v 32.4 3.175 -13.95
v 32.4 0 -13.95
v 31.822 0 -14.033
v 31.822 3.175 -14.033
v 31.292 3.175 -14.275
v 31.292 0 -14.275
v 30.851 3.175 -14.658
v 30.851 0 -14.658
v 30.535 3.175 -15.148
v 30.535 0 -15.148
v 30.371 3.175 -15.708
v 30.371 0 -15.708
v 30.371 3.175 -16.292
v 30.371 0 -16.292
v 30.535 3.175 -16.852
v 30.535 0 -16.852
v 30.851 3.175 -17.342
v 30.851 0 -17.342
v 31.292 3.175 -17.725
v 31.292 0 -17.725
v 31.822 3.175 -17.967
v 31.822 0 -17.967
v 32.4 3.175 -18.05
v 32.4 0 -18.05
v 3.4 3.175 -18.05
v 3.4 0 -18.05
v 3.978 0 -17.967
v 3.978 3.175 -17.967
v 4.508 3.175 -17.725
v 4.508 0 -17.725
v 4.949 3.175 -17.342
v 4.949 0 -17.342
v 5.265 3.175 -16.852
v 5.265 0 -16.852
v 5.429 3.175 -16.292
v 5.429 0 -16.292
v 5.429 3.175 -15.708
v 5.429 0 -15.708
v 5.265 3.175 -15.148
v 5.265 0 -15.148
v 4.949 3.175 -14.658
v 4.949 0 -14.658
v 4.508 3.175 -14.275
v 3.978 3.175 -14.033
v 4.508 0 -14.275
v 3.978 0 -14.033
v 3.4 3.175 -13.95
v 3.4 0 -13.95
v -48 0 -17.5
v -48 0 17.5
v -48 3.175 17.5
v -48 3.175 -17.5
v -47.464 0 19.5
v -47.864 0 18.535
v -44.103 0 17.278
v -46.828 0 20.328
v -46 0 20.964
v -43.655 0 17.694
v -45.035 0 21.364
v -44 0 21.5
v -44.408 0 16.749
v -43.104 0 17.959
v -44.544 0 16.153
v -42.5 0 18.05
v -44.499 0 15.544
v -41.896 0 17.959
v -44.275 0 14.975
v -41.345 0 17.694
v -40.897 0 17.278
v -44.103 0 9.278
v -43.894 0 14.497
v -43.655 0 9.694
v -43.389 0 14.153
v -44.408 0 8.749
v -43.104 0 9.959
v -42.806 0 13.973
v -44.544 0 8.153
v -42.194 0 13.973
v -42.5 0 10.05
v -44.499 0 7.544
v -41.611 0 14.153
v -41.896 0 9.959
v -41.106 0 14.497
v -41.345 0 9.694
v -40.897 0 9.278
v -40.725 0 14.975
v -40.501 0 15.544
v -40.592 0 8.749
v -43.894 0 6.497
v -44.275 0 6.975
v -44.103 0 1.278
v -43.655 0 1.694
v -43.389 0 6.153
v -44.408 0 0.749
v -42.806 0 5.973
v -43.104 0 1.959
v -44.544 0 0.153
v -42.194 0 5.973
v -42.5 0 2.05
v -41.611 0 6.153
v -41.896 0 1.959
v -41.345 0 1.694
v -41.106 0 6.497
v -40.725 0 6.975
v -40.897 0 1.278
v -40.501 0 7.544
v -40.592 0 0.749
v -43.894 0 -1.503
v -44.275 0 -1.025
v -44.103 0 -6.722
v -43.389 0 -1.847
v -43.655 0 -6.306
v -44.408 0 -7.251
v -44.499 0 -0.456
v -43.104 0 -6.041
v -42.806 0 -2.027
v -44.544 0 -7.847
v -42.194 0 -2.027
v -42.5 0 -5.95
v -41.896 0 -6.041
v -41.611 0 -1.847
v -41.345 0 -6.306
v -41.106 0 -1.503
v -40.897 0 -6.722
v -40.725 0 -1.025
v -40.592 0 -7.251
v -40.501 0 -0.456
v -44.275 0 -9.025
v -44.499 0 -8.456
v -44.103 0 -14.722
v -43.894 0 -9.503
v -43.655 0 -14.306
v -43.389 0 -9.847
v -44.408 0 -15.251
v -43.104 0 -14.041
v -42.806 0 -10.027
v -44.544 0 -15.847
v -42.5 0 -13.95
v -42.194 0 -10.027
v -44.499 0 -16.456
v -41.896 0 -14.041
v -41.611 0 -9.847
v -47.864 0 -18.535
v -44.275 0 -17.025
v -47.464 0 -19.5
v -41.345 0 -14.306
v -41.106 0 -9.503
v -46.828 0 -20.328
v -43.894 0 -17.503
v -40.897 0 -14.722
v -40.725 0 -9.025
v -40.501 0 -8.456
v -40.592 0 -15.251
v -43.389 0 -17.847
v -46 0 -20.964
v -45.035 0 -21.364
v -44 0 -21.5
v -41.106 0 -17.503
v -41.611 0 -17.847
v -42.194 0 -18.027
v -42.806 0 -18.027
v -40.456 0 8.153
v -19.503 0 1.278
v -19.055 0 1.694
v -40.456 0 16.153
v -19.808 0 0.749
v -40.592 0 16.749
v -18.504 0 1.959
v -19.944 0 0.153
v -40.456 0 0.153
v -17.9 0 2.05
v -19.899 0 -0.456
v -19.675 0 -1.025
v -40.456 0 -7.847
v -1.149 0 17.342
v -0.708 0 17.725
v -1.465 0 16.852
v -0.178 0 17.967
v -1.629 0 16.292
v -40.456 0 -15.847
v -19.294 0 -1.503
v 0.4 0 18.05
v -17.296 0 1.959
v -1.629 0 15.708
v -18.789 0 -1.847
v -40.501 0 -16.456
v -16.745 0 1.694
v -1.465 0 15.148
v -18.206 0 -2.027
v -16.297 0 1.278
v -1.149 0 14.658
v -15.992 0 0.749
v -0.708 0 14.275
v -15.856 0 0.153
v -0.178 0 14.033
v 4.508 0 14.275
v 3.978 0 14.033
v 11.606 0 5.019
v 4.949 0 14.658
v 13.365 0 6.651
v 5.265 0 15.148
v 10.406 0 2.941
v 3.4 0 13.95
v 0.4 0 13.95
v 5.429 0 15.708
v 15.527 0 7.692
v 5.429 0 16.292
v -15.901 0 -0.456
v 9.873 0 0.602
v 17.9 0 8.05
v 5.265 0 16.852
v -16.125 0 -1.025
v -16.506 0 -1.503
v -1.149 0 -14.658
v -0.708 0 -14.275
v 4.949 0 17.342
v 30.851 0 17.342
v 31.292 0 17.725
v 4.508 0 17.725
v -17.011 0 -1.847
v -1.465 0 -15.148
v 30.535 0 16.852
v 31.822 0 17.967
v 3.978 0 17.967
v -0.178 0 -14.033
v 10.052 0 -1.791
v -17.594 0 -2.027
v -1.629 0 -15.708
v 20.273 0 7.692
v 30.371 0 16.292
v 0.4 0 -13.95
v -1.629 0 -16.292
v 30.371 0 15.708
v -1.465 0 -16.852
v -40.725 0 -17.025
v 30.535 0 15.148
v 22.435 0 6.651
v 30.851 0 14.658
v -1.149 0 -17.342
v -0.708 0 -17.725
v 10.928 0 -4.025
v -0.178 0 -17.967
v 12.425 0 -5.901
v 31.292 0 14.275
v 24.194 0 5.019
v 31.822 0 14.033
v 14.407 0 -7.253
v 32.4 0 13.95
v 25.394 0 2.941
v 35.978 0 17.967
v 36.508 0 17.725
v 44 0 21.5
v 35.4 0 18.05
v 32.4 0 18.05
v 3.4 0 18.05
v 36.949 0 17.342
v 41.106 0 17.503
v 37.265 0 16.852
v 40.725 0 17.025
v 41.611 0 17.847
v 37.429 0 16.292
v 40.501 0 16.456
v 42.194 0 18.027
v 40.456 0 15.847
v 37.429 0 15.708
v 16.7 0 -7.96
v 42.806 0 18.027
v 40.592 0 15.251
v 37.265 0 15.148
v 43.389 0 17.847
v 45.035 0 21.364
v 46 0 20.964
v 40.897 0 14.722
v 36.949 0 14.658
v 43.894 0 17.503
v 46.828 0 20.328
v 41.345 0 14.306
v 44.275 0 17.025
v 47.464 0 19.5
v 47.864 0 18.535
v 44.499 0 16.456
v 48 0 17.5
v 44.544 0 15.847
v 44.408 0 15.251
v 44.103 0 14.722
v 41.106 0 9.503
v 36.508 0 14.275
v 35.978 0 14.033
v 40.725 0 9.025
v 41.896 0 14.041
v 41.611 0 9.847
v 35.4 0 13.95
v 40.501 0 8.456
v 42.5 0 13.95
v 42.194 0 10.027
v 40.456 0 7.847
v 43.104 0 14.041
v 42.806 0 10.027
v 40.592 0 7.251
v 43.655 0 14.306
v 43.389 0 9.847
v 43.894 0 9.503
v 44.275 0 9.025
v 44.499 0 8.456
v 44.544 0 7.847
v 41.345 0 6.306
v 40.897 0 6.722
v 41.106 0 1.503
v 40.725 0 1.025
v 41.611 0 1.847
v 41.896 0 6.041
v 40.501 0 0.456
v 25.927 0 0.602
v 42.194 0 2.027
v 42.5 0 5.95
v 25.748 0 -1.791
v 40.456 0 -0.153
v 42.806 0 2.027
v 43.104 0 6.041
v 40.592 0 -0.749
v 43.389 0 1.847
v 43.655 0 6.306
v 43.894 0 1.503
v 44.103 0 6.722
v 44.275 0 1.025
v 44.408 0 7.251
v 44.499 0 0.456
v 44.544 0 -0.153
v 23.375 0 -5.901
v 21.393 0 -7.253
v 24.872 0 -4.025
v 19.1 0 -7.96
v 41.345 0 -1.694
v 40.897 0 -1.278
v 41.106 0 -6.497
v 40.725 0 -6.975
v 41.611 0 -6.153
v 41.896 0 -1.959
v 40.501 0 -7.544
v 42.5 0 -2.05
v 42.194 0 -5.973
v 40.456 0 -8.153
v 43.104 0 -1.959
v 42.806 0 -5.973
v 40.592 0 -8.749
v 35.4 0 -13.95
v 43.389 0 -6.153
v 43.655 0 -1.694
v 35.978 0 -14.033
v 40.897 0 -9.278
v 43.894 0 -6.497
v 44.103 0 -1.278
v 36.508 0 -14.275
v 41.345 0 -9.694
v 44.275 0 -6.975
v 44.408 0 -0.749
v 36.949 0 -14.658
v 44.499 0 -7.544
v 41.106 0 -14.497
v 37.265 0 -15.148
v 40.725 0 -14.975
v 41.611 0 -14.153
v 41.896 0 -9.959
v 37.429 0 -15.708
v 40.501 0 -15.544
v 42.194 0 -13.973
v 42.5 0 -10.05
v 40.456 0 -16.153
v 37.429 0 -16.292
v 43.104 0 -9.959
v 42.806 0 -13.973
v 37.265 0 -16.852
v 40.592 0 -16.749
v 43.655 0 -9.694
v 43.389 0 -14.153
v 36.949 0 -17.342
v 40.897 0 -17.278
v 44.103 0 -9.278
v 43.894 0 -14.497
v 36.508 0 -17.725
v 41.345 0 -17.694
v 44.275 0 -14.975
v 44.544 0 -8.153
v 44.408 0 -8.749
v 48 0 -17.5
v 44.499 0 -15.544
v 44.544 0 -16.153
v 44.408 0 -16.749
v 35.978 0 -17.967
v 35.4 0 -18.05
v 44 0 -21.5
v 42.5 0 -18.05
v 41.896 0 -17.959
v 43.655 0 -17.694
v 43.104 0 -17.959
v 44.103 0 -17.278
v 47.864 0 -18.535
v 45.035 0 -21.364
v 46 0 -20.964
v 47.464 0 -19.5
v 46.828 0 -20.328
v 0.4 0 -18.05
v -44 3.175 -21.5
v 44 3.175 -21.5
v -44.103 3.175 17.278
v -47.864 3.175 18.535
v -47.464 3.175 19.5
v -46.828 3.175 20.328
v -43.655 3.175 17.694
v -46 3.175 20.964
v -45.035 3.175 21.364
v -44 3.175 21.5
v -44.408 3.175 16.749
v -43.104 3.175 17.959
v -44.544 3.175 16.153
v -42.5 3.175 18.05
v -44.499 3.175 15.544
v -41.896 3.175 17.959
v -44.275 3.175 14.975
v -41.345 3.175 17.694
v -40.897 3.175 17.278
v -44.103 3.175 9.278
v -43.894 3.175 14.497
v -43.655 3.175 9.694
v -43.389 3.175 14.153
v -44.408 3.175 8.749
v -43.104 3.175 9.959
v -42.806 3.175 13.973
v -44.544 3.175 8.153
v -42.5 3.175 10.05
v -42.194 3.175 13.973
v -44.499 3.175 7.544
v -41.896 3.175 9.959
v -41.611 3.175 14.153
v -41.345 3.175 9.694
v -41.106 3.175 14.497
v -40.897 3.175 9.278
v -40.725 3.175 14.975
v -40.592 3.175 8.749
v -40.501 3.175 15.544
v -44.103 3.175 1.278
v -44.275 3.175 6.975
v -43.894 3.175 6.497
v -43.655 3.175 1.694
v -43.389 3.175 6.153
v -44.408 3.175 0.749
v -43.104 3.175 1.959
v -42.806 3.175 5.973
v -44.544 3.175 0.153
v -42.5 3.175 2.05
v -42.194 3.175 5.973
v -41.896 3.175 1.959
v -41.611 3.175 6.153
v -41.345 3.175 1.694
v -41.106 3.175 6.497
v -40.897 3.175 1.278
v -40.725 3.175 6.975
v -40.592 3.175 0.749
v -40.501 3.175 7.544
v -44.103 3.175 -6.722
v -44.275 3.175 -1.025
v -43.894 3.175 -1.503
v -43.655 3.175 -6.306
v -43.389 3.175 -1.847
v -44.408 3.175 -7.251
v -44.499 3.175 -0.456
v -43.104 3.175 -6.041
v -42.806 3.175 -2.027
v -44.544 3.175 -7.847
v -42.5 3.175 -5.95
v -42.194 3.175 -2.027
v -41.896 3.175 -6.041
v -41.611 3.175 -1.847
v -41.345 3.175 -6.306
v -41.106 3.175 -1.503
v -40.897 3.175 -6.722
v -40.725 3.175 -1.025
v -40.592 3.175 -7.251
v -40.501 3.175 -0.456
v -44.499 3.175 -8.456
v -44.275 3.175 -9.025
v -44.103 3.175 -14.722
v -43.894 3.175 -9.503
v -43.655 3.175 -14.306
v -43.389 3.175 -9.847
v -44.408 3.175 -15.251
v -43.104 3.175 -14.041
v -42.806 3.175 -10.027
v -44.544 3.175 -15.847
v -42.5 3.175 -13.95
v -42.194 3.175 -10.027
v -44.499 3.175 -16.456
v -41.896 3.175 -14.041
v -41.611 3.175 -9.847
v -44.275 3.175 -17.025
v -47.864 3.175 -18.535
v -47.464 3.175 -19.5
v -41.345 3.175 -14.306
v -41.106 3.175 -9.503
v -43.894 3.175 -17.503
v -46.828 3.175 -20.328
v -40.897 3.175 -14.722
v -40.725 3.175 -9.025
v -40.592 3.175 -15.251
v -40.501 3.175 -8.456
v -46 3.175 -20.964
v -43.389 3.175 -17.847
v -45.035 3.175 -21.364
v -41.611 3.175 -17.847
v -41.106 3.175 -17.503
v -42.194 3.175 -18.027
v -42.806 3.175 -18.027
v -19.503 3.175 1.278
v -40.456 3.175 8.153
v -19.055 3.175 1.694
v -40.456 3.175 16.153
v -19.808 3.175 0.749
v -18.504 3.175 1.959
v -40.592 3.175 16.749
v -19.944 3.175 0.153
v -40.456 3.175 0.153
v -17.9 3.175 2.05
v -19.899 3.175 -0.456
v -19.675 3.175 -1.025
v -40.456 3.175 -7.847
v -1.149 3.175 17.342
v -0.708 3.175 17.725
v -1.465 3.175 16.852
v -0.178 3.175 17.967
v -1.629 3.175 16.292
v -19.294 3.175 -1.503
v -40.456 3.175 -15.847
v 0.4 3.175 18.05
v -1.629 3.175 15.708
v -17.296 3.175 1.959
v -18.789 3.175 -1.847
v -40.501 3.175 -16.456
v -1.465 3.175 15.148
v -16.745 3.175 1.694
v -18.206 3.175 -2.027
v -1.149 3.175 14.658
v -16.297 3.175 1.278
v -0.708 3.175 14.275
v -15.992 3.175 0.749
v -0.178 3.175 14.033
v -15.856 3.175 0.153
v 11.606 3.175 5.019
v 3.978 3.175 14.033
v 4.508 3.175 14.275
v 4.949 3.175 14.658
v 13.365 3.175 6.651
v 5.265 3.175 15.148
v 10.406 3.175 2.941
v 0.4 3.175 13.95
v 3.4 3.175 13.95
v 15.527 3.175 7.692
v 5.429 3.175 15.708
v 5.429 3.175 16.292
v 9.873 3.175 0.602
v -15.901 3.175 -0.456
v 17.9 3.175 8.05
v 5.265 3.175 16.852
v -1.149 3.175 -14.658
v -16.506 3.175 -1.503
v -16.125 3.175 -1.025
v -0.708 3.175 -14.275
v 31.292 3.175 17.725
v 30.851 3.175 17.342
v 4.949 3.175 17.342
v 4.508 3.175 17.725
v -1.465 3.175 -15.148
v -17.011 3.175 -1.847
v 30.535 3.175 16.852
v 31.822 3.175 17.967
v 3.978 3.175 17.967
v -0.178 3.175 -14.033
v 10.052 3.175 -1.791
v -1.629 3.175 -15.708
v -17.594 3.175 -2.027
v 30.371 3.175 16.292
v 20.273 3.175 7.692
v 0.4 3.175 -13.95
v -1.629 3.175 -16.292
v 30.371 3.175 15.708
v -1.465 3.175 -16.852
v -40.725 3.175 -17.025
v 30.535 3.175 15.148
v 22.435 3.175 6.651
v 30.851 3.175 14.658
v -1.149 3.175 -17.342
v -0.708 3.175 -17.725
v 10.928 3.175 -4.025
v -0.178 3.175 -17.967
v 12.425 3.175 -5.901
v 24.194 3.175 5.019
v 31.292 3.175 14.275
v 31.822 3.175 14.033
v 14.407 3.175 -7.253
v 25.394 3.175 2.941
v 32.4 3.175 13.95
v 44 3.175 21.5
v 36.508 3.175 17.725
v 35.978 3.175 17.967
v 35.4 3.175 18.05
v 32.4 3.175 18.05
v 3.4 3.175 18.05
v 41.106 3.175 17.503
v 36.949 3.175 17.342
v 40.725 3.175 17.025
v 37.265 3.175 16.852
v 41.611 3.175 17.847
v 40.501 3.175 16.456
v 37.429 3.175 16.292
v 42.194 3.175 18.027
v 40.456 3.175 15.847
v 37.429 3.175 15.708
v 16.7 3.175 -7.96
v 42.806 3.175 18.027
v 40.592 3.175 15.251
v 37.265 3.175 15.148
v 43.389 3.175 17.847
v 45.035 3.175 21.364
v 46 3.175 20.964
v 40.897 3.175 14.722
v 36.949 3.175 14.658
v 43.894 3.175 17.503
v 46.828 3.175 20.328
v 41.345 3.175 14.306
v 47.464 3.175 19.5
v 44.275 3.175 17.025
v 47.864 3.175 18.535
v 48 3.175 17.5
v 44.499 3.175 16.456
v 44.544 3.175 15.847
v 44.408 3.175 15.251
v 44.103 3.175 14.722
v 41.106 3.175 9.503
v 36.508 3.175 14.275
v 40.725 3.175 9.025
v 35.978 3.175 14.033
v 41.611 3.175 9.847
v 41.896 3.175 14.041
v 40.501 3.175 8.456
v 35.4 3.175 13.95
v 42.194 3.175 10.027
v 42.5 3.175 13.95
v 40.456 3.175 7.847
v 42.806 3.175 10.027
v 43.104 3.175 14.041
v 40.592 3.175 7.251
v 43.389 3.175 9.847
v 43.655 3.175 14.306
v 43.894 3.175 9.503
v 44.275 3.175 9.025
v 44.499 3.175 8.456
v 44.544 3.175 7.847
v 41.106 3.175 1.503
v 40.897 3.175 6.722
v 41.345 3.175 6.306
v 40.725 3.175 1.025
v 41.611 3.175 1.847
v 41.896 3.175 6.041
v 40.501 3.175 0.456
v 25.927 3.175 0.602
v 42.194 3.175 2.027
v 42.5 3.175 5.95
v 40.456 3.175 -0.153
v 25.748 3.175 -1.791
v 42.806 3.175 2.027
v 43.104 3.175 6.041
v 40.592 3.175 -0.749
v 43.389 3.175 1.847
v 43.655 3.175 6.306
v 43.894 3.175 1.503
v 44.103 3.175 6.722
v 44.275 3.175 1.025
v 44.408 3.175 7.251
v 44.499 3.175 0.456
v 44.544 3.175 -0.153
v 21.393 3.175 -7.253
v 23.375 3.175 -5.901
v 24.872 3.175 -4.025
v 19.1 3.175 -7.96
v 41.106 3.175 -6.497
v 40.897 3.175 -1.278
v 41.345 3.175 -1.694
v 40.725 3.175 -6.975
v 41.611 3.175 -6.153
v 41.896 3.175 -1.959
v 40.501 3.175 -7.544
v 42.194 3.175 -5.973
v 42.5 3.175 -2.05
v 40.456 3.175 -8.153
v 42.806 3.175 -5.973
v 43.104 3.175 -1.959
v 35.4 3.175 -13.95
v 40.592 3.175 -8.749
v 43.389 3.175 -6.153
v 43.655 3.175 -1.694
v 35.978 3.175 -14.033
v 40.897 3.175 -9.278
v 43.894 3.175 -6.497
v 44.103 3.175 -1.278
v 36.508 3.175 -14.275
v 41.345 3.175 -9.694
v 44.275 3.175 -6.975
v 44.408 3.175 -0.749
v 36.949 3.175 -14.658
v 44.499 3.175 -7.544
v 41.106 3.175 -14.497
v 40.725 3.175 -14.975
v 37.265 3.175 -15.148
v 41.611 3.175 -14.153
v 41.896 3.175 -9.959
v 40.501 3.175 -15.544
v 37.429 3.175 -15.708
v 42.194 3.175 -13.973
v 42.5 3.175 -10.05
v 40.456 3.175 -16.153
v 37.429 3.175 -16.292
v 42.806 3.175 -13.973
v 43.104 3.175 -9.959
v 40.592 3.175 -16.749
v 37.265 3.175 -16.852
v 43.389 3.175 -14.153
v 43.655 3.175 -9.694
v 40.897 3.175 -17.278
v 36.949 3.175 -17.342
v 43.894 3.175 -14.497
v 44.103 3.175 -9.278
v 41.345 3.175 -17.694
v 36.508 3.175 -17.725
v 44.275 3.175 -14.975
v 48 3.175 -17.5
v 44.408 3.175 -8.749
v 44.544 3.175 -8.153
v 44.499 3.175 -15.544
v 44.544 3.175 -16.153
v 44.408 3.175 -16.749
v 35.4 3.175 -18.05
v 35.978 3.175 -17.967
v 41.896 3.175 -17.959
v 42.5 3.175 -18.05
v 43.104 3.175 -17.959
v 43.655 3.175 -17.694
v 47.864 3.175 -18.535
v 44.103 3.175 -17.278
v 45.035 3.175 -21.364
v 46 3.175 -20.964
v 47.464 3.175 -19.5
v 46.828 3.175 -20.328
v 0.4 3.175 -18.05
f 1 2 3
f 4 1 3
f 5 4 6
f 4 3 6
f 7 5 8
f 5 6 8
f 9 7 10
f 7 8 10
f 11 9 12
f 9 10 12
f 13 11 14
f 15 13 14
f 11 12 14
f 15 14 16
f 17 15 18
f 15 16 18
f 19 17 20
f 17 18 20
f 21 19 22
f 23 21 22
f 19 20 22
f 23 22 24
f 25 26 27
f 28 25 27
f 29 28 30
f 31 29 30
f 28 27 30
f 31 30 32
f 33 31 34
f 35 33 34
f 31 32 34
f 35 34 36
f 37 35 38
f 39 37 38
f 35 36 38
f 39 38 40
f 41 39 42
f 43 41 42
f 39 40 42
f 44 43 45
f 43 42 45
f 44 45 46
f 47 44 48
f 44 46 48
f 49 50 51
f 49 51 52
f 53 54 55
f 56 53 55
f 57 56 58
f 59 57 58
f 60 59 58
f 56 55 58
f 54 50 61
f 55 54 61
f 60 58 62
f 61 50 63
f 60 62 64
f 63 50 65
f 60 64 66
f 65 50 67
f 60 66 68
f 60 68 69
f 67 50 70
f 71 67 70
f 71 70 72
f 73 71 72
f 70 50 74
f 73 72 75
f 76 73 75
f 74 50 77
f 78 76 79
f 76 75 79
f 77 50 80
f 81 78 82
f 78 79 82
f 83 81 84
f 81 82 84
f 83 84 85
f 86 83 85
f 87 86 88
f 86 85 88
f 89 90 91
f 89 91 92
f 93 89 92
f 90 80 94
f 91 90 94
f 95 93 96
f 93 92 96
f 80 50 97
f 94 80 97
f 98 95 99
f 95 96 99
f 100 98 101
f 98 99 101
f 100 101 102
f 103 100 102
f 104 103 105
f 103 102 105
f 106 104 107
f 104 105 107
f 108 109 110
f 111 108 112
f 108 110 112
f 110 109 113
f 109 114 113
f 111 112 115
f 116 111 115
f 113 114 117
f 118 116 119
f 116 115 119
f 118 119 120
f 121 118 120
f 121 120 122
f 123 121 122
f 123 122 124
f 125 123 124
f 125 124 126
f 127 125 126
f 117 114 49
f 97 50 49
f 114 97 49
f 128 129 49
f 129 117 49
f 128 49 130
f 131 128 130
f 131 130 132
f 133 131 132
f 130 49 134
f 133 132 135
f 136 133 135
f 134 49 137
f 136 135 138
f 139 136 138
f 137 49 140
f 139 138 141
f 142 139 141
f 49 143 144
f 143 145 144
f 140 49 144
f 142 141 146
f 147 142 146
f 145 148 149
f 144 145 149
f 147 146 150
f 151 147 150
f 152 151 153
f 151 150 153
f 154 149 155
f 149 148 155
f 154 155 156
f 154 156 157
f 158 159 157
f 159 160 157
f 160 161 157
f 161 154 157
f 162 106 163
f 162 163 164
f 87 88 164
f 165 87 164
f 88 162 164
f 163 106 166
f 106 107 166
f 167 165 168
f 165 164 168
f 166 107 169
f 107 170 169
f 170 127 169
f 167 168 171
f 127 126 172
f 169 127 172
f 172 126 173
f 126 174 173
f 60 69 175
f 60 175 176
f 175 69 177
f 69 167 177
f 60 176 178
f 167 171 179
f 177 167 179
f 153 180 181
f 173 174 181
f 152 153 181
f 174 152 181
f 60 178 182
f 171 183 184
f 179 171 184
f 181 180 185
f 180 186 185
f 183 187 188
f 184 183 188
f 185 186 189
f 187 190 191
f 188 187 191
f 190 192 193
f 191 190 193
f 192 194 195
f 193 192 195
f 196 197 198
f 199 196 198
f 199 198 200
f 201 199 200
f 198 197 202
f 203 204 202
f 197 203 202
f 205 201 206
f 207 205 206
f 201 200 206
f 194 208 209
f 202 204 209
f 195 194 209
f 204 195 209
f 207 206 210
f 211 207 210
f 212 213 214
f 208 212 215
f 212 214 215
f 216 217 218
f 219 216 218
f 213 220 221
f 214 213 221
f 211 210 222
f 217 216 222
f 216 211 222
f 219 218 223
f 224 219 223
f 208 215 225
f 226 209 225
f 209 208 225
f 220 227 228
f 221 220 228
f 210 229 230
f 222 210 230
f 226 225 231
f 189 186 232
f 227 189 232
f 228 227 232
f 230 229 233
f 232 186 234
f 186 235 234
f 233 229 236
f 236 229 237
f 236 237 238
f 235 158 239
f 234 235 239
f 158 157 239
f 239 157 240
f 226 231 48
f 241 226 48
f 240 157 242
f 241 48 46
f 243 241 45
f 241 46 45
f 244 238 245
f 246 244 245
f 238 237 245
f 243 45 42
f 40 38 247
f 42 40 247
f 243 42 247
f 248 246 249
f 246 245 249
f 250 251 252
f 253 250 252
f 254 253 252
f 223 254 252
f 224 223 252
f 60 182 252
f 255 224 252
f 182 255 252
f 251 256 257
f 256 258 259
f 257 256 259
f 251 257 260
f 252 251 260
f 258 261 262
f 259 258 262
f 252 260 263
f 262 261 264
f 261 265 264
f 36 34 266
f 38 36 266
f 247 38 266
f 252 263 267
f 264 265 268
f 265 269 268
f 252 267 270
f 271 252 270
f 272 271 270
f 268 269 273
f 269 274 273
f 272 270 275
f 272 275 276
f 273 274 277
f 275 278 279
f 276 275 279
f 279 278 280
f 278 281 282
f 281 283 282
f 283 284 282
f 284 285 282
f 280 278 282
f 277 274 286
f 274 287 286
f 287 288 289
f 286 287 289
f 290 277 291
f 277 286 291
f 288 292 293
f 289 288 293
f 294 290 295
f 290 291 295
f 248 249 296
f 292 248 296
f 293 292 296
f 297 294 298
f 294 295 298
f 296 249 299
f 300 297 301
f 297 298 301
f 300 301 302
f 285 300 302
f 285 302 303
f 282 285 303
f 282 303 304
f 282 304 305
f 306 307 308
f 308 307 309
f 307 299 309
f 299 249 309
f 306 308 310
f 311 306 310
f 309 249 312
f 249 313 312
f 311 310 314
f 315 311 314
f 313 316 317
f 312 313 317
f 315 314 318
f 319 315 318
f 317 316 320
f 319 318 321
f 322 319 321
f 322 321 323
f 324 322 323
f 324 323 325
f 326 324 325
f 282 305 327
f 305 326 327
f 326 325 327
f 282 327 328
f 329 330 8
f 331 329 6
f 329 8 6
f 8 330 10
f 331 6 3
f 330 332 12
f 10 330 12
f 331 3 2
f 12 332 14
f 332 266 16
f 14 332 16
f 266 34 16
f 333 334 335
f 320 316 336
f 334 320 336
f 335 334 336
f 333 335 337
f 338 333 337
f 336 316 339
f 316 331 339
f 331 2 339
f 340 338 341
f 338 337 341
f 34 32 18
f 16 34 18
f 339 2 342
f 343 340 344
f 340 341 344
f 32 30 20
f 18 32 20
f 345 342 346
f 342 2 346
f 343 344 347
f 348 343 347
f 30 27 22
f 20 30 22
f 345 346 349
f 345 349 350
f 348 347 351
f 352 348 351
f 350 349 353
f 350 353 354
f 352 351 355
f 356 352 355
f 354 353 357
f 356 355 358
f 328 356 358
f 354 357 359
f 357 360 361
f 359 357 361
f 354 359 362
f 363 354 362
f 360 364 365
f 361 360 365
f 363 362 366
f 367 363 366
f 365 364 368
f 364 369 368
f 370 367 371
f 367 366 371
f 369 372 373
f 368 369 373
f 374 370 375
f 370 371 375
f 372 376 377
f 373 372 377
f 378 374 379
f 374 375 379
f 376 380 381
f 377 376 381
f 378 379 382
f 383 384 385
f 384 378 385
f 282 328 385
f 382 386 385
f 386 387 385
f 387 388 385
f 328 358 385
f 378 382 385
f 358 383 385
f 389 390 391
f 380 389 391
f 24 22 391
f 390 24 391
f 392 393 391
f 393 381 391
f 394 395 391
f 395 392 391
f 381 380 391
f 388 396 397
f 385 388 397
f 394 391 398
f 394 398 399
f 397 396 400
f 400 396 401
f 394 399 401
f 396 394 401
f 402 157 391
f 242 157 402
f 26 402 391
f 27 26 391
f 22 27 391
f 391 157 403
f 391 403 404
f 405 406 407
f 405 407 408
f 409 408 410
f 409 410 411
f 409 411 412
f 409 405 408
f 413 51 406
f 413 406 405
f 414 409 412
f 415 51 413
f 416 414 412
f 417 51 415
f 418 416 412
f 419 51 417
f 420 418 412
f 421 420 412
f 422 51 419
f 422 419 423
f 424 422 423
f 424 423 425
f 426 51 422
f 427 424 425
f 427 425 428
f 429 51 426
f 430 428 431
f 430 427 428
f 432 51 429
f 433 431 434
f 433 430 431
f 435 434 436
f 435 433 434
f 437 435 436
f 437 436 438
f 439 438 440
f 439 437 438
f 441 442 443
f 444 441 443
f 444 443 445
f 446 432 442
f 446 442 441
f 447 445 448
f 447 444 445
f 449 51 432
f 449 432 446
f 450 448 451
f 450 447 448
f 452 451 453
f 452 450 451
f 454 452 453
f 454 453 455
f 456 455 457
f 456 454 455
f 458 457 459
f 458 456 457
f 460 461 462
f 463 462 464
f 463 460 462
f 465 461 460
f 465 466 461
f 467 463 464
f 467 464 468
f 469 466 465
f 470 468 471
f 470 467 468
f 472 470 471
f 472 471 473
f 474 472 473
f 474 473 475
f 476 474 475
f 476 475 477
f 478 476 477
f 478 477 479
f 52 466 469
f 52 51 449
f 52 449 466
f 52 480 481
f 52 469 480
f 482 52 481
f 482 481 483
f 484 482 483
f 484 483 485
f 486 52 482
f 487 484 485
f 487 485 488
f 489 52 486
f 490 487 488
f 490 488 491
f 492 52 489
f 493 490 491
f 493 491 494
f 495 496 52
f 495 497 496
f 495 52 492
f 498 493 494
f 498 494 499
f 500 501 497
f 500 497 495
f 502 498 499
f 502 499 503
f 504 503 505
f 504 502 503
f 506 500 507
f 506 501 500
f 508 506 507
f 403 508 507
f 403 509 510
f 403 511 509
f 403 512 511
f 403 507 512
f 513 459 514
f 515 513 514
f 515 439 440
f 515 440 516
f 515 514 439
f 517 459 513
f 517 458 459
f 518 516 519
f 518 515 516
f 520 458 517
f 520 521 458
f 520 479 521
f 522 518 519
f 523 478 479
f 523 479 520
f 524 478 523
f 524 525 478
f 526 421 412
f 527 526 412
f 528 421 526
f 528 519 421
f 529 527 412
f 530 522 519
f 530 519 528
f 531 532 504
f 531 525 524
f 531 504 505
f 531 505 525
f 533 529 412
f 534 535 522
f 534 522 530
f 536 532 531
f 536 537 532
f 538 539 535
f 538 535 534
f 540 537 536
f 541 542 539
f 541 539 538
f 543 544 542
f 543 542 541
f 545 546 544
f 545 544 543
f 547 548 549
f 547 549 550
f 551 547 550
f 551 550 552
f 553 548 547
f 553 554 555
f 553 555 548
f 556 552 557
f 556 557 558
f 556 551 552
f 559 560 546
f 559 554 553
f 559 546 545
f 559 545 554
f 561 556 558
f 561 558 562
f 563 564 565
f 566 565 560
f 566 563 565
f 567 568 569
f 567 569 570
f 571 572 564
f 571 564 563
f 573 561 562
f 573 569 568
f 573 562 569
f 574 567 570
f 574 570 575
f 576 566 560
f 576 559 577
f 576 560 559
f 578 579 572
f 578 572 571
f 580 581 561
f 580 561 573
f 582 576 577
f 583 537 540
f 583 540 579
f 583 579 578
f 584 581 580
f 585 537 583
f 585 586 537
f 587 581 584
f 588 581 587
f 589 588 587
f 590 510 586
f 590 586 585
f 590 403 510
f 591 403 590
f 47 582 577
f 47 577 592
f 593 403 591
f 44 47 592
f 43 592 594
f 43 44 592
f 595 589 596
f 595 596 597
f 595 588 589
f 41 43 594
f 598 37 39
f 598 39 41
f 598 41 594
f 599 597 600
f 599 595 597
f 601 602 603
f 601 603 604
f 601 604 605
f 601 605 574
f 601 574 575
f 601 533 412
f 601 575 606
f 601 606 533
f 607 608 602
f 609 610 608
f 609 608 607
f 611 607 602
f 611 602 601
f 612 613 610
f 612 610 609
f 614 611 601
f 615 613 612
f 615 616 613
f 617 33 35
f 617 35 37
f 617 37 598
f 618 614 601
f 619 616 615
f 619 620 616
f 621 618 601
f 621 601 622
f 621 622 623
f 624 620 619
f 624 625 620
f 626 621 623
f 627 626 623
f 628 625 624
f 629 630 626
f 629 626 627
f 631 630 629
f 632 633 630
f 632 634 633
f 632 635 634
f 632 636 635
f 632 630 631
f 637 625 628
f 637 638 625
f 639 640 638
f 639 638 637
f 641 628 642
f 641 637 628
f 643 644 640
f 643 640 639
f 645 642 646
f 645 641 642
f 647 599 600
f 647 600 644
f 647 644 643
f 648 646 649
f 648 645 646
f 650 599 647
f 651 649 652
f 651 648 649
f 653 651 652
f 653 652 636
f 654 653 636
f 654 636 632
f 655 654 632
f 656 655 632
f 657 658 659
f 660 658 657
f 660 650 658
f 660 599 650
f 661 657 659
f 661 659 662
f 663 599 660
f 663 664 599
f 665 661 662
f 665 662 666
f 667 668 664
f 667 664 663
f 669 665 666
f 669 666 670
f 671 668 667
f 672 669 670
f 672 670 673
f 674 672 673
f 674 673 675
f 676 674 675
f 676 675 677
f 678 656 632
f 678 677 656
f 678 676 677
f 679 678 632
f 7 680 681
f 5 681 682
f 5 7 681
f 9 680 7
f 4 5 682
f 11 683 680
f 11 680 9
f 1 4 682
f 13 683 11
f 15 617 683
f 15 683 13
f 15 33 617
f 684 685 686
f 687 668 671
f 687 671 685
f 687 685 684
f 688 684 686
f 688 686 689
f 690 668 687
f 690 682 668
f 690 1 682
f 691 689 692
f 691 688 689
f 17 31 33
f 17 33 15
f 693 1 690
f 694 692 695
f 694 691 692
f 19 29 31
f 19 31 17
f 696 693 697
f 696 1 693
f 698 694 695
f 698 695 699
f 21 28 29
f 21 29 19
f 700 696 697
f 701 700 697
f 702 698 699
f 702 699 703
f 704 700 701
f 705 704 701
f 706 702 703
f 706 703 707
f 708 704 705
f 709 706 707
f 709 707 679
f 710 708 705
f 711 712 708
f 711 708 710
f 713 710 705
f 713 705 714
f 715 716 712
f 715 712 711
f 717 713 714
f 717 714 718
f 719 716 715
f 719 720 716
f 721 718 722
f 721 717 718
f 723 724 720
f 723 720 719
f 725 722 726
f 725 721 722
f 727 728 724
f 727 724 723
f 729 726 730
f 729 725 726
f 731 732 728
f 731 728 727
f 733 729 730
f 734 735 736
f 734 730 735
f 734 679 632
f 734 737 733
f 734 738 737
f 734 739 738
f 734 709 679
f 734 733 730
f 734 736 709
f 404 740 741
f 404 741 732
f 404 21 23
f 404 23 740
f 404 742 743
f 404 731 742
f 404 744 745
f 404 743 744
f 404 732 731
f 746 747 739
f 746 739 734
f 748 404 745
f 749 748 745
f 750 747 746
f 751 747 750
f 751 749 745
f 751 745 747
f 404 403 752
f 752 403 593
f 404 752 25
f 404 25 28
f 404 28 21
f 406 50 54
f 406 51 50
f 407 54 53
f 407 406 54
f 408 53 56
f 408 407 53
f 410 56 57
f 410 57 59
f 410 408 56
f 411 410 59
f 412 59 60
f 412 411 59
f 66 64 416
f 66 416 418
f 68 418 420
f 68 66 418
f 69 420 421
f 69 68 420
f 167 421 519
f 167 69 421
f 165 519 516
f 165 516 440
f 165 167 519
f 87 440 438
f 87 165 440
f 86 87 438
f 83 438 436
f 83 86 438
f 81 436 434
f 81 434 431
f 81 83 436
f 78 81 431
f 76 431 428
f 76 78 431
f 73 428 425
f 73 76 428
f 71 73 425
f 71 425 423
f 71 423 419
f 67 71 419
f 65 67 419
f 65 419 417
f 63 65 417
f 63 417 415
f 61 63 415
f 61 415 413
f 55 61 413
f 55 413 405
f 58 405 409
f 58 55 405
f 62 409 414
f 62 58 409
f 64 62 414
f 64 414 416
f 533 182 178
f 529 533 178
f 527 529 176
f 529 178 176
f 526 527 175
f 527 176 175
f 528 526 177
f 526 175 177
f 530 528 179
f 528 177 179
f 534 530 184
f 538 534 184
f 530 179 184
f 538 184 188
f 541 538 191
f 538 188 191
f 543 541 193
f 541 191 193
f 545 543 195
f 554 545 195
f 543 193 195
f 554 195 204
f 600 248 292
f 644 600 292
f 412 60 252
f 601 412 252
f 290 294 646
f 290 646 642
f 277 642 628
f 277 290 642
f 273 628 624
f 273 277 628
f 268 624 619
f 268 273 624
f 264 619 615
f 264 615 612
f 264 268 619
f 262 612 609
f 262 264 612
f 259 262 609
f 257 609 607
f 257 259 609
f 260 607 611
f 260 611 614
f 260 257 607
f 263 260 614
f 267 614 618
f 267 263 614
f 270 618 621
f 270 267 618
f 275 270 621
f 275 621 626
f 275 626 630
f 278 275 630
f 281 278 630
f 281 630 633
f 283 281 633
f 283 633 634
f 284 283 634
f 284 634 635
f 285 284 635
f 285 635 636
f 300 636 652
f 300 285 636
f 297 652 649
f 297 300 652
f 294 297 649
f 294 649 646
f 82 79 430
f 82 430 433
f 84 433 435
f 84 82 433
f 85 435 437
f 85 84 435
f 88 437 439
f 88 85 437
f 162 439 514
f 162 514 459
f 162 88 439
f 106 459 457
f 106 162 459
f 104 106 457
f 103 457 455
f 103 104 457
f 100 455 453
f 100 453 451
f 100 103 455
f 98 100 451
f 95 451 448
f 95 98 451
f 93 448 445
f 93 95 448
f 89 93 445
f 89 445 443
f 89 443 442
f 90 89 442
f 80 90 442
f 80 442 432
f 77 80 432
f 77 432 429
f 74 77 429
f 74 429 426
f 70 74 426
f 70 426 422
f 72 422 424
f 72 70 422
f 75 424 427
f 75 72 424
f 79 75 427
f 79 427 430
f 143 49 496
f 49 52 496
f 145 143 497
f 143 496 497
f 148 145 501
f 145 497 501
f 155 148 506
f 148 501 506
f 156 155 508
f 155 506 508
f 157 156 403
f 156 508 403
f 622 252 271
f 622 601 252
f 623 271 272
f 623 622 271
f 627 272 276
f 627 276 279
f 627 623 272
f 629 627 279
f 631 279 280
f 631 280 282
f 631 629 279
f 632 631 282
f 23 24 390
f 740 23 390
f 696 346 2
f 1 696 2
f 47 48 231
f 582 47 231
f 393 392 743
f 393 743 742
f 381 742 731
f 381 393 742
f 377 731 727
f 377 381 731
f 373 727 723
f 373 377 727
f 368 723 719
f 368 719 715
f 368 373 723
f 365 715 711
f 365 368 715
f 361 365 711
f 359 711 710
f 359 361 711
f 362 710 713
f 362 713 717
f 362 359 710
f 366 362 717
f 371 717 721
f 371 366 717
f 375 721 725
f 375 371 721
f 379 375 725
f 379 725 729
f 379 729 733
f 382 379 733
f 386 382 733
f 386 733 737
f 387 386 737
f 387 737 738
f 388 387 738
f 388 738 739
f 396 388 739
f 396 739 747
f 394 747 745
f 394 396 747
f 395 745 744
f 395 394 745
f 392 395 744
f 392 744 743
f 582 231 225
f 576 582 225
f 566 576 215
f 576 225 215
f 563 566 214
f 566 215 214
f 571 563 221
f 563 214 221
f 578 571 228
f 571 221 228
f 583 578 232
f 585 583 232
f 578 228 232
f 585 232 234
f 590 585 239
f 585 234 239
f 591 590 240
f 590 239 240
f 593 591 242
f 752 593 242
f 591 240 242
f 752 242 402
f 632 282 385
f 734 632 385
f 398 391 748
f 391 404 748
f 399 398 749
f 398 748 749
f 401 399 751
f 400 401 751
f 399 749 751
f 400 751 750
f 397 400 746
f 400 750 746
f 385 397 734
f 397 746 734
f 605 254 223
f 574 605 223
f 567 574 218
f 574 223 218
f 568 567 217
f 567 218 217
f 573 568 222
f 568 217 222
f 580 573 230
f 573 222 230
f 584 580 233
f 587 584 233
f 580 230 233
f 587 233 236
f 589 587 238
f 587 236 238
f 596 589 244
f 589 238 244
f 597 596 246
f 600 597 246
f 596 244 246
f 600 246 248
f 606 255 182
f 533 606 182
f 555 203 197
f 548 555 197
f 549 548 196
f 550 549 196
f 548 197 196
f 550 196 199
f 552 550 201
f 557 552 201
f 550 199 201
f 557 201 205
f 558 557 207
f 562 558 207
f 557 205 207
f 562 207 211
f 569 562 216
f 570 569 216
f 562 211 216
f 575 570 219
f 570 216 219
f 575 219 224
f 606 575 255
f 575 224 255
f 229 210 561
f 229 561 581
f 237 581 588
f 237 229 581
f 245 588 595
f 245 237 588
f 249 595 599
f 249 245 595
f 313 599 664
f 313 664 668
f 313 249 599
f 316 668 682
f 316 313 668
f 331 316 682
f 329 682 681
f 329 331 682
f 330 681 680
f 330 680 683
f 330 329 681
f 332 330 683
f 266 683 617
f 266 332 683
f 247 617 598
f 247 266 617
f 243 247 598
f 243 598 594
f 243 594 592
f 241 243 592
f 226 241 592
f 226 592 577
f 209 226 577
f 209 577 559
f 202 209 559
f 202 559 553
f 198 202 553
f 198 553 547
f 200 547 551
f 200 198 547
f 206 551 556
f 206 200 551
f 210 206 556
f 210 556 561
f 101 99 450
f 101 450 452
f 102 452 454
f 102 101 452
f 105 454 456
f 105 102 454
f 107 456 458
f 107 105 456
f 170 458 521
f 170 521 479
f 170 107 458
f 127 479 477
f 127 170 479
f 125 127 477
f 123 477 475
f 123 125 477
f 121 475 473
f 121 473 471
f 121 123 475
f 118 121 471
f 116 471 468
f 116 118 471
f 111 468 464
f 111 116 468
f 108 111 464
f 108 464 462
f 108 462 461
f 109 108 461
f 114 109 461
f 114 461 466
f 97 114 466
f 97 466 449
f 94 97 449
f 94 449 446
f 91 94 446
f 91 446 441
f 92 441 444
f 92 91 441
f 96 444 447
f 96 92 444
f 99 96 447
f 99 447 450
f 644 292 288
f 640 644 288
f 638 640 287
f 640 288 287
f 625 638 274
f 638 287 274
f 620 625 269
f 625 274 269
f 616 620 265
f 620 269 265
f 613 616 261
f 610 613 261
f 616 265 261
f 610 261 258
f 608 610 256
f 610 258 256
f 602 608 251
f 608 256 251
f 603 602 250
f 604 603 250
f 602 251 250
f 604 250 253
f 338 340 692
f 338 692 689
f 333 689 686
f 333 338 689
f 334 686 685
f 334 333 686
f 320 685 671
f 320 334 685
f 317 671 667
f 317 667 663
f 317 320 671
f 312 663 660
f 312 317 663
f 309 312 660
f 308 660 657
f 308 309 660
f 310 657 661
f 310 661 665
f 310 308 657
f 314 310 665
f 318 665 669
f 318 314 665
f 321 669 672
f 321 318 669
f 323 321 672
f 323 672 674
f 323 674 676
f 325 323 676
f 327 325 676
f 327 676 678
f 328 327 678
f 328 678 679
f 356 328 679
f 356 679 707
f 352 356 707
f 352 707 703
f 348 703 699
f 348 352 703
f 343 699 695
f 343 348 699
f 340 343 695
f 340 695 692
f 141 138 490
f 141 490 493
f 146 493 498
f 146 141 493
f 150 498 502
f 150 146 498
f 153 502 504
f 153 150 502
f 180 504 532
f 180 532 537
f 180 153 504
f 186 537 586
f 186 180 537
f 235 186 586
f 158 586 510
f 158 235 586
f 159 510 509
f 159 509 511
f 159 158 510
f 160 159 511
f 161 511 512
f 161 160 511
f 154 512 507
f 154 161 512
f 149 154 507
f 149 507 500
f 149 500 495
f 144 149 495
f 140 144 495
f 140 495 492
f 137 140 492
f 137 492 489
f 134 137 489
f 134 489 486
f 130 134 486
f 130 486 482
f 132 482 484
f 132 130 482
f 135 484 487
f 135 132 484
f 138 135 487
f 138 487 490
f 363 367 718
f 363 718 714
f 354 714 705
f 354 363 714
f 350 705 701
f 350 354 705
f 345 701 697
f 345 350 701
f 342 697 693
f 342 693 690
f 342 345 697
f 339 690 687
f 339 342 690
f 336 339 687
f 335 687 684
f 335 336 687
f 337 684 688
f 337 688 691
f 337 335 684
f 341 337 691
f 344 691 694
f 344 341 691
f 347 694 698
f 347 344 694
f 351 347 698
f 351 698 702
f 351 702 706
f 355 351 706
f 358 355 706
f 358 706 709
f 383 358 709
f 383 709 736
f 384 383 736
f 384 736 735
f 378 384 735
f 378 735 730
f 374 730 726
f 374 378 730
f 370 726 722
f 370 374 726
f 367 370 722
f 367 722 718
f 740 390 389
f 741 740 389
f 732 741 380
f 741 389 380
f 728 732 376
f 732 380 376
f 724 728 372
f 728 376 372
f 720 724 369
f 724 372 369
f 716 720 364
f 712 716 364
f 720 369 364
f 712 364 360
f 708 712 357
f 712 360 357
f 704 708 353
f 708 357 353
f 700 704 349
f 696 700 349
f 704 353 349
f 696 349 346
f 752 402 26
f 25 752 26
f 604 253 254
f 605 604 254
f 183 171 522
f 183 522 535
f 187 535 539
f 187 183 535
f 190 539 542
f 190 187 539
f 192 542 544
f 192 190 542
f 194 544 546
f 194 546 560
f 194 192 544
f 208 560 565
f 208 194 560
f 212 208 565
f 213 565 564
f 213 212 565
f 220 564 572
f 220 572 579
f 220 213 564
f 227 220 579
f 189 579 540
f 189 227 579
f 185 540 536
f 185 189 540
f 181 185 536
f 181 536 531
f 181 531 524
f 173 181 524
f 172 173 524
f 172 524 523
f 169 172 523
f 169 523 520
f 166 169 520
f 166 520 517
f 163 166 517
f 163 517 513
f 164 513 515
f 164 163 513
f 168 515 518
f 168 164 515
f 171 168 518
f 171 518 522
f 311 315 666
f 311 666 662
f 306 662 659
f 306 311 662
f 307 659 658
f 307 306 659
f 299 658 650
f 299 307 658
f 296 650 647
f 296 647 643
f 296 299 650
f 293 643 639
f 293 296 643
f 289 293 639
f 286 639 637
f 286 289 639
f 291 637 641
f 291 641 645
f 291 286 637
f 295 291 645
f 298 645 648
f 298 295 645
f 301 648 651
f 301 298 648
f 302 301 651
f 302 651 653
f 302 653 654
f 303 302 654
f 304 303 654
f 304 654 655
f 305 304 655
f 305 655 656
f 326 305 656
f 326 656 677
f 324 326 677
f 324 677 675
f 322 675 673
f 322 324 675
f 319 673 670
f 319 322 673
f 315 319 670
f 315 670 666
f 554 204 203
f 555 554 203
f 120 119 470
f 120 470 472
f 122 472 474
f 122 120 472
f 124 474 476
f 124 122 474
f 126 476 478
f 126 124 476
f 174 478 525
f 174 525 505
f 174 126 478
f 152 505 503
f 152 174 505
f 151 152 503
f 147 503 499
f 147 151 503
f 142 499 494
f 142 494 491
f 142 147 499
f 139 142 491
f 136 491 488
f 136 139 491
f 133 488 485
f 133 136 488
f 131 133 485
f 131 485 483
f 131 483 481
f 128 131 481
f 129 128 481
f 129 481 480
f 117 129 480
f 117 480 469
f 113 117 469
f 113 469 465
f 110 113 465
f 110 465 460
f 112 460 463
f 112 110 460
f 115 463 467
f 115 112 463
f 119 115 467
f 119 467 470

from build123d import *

# Parameters (mm, degrees)
SKETCH1_W           = 96
SKETCH1_H           = 43
SKETCH1_R           = 8.05
SKETCH1_R_2         = 2.05
BOSS_EXTRUDE1_DEPTH = 3.175
FILLET1_R           = 4


with BuildPart() as part:
    # Sketch1 → Boss-Extrude1 (new body)
    with BuildSketch(Plane(origin=(0, 0, 0), x_dir=(1, 0, 0), z_dir=(0, 1, 0))):
        Rectangle(SKETCH1_W, SKETCH1_H)
        with Locations(Location((17.9, 0, 0), (0, 0, 270))):
            Circle(SKETCH1_R, mode=Mode.SUBTRACT)
        with Locations(Location((-17.9, 0, 0), (0, 0, 270))):
            Circle(SKETCH1_R_2, mode=Mode.SUBTRACT)
        with Locations(Location((-42.5, 16, 0), (0, 0, 270))):
            Circle(SKETCH1_R_2, mode=Mode.SUBTRACT)
        with Locations(Location((-42.5, 8, 0), (0, 0, 270))):
            Circle(SKETCH1_R_2, mode=Mode.SUBTRACT)
        with Locations(Location((-42.5, 0, 0), (0, 0, 270))):
            Circle(SKETCH1_R_2, mode=Mode.SUBTRACT)
        with Locations(Location((-42.5, -8, 0), (0, 0, 270))):
            Circle(SKETCH1_R_2, mode=Mode.SUBTRACT)
        with Locations(Location((-42.5, -16, 0), (0, 0, 270))):
            Circle(SKETCH1_R_2, mode=Mode.SUBTRACT)
        with Locations(Location((42.5, 16, 0), (0, 0, 90))):
            Circle(SKETCH1_R_2, mode=Mode.SUBTRACT)
        with Locations(Location((42.5, 8, 0), (0, 0, 90))):
            Circle(SKETCH1_R_2, mode=Mode.SUBTRACT)
        with Locations(Location((42.5, 0, 0), (0, 0, 90))):
            Circle(SKETCH1_R_2, mode=Mode.SUBTRACT)
        with Locations(Location((42.5, -8, 0), (0, 0, 90))):
            Circle(SKETCH1_R_2, mode=Mode.SUBTRACT)
        with Locations(Location((42.5, -16, 0), (0, 0, 90))):
            Circle(SKETCH1_R_2, mode=Mode.SUBTRACT)
        with BuildLine():
            Line((0.4, 18.05), (3.4, 18.05))
            ThreePointArc((3.4, 18.05), (5.45, 16), (3.4, 13.95))
            Line((3.4, 13.95), (0.4, 13.95))
            ThreePointArc((0.4, 13.95), (-1.65, 16), (0.4, 18.05))
        make_face(mode=Mode.SUBTRACT)
        with BuildLine():
            Line((0.4, -13.95), (3.4, -13.95))
            ThreePointArc((3.4, -13.95), (5.45, -16), (3.4, -18.05))
            Line((3.4, -18.05), (0.4, -18.05))
            ThreePointArc((0.4, -18.05), (-1.65, -16), (0.4, -13.95))
        make_face(mode=Mode.SUBTRACT)
        with BuildLine():
            Line((35.4, -18.05), (32.4, -18.05))
            ThreePointArc((32.4, -18.05), (30.35, -16), (32.4, -13.95))
            Line((32.4, -13.95), (35.4, -13.95))
            ThreePointArc((35.4, -13.95), (37.45, -16), (35.4, -18.05))
        make_face(mode=Mode.SUBTRACT)
        with BuildLine():
            Line((35.4, 13.95), (32.4, 13.95))
            ThreePointArc((32.4, 13.95), (30.35, 16), (32.4, 18.05))
            Line((32.4, 18.05), (35.4, 18.05))
            ThreePointArc((35.4, 18.05), (37.45, 16), (35.4, 13.95))
        make_face(mode=Mode.SUBTRACT)
    extrude(amount=BOSS_EXTRUDE1_DEPTH)

    # Fillet1
    fillet1_edges = [part.edges().sort_by_distance(p)[0] for p in [
        (-48, 1.5875, -21.5),
        (48, 1.5875, -21.5),
        (48, 1.5875, 21.5),
        (-48, 1.5875, 21.5),
    ]]
    fillet(fillet1_edges, radius=FILLET1_R)


solid = part.part
